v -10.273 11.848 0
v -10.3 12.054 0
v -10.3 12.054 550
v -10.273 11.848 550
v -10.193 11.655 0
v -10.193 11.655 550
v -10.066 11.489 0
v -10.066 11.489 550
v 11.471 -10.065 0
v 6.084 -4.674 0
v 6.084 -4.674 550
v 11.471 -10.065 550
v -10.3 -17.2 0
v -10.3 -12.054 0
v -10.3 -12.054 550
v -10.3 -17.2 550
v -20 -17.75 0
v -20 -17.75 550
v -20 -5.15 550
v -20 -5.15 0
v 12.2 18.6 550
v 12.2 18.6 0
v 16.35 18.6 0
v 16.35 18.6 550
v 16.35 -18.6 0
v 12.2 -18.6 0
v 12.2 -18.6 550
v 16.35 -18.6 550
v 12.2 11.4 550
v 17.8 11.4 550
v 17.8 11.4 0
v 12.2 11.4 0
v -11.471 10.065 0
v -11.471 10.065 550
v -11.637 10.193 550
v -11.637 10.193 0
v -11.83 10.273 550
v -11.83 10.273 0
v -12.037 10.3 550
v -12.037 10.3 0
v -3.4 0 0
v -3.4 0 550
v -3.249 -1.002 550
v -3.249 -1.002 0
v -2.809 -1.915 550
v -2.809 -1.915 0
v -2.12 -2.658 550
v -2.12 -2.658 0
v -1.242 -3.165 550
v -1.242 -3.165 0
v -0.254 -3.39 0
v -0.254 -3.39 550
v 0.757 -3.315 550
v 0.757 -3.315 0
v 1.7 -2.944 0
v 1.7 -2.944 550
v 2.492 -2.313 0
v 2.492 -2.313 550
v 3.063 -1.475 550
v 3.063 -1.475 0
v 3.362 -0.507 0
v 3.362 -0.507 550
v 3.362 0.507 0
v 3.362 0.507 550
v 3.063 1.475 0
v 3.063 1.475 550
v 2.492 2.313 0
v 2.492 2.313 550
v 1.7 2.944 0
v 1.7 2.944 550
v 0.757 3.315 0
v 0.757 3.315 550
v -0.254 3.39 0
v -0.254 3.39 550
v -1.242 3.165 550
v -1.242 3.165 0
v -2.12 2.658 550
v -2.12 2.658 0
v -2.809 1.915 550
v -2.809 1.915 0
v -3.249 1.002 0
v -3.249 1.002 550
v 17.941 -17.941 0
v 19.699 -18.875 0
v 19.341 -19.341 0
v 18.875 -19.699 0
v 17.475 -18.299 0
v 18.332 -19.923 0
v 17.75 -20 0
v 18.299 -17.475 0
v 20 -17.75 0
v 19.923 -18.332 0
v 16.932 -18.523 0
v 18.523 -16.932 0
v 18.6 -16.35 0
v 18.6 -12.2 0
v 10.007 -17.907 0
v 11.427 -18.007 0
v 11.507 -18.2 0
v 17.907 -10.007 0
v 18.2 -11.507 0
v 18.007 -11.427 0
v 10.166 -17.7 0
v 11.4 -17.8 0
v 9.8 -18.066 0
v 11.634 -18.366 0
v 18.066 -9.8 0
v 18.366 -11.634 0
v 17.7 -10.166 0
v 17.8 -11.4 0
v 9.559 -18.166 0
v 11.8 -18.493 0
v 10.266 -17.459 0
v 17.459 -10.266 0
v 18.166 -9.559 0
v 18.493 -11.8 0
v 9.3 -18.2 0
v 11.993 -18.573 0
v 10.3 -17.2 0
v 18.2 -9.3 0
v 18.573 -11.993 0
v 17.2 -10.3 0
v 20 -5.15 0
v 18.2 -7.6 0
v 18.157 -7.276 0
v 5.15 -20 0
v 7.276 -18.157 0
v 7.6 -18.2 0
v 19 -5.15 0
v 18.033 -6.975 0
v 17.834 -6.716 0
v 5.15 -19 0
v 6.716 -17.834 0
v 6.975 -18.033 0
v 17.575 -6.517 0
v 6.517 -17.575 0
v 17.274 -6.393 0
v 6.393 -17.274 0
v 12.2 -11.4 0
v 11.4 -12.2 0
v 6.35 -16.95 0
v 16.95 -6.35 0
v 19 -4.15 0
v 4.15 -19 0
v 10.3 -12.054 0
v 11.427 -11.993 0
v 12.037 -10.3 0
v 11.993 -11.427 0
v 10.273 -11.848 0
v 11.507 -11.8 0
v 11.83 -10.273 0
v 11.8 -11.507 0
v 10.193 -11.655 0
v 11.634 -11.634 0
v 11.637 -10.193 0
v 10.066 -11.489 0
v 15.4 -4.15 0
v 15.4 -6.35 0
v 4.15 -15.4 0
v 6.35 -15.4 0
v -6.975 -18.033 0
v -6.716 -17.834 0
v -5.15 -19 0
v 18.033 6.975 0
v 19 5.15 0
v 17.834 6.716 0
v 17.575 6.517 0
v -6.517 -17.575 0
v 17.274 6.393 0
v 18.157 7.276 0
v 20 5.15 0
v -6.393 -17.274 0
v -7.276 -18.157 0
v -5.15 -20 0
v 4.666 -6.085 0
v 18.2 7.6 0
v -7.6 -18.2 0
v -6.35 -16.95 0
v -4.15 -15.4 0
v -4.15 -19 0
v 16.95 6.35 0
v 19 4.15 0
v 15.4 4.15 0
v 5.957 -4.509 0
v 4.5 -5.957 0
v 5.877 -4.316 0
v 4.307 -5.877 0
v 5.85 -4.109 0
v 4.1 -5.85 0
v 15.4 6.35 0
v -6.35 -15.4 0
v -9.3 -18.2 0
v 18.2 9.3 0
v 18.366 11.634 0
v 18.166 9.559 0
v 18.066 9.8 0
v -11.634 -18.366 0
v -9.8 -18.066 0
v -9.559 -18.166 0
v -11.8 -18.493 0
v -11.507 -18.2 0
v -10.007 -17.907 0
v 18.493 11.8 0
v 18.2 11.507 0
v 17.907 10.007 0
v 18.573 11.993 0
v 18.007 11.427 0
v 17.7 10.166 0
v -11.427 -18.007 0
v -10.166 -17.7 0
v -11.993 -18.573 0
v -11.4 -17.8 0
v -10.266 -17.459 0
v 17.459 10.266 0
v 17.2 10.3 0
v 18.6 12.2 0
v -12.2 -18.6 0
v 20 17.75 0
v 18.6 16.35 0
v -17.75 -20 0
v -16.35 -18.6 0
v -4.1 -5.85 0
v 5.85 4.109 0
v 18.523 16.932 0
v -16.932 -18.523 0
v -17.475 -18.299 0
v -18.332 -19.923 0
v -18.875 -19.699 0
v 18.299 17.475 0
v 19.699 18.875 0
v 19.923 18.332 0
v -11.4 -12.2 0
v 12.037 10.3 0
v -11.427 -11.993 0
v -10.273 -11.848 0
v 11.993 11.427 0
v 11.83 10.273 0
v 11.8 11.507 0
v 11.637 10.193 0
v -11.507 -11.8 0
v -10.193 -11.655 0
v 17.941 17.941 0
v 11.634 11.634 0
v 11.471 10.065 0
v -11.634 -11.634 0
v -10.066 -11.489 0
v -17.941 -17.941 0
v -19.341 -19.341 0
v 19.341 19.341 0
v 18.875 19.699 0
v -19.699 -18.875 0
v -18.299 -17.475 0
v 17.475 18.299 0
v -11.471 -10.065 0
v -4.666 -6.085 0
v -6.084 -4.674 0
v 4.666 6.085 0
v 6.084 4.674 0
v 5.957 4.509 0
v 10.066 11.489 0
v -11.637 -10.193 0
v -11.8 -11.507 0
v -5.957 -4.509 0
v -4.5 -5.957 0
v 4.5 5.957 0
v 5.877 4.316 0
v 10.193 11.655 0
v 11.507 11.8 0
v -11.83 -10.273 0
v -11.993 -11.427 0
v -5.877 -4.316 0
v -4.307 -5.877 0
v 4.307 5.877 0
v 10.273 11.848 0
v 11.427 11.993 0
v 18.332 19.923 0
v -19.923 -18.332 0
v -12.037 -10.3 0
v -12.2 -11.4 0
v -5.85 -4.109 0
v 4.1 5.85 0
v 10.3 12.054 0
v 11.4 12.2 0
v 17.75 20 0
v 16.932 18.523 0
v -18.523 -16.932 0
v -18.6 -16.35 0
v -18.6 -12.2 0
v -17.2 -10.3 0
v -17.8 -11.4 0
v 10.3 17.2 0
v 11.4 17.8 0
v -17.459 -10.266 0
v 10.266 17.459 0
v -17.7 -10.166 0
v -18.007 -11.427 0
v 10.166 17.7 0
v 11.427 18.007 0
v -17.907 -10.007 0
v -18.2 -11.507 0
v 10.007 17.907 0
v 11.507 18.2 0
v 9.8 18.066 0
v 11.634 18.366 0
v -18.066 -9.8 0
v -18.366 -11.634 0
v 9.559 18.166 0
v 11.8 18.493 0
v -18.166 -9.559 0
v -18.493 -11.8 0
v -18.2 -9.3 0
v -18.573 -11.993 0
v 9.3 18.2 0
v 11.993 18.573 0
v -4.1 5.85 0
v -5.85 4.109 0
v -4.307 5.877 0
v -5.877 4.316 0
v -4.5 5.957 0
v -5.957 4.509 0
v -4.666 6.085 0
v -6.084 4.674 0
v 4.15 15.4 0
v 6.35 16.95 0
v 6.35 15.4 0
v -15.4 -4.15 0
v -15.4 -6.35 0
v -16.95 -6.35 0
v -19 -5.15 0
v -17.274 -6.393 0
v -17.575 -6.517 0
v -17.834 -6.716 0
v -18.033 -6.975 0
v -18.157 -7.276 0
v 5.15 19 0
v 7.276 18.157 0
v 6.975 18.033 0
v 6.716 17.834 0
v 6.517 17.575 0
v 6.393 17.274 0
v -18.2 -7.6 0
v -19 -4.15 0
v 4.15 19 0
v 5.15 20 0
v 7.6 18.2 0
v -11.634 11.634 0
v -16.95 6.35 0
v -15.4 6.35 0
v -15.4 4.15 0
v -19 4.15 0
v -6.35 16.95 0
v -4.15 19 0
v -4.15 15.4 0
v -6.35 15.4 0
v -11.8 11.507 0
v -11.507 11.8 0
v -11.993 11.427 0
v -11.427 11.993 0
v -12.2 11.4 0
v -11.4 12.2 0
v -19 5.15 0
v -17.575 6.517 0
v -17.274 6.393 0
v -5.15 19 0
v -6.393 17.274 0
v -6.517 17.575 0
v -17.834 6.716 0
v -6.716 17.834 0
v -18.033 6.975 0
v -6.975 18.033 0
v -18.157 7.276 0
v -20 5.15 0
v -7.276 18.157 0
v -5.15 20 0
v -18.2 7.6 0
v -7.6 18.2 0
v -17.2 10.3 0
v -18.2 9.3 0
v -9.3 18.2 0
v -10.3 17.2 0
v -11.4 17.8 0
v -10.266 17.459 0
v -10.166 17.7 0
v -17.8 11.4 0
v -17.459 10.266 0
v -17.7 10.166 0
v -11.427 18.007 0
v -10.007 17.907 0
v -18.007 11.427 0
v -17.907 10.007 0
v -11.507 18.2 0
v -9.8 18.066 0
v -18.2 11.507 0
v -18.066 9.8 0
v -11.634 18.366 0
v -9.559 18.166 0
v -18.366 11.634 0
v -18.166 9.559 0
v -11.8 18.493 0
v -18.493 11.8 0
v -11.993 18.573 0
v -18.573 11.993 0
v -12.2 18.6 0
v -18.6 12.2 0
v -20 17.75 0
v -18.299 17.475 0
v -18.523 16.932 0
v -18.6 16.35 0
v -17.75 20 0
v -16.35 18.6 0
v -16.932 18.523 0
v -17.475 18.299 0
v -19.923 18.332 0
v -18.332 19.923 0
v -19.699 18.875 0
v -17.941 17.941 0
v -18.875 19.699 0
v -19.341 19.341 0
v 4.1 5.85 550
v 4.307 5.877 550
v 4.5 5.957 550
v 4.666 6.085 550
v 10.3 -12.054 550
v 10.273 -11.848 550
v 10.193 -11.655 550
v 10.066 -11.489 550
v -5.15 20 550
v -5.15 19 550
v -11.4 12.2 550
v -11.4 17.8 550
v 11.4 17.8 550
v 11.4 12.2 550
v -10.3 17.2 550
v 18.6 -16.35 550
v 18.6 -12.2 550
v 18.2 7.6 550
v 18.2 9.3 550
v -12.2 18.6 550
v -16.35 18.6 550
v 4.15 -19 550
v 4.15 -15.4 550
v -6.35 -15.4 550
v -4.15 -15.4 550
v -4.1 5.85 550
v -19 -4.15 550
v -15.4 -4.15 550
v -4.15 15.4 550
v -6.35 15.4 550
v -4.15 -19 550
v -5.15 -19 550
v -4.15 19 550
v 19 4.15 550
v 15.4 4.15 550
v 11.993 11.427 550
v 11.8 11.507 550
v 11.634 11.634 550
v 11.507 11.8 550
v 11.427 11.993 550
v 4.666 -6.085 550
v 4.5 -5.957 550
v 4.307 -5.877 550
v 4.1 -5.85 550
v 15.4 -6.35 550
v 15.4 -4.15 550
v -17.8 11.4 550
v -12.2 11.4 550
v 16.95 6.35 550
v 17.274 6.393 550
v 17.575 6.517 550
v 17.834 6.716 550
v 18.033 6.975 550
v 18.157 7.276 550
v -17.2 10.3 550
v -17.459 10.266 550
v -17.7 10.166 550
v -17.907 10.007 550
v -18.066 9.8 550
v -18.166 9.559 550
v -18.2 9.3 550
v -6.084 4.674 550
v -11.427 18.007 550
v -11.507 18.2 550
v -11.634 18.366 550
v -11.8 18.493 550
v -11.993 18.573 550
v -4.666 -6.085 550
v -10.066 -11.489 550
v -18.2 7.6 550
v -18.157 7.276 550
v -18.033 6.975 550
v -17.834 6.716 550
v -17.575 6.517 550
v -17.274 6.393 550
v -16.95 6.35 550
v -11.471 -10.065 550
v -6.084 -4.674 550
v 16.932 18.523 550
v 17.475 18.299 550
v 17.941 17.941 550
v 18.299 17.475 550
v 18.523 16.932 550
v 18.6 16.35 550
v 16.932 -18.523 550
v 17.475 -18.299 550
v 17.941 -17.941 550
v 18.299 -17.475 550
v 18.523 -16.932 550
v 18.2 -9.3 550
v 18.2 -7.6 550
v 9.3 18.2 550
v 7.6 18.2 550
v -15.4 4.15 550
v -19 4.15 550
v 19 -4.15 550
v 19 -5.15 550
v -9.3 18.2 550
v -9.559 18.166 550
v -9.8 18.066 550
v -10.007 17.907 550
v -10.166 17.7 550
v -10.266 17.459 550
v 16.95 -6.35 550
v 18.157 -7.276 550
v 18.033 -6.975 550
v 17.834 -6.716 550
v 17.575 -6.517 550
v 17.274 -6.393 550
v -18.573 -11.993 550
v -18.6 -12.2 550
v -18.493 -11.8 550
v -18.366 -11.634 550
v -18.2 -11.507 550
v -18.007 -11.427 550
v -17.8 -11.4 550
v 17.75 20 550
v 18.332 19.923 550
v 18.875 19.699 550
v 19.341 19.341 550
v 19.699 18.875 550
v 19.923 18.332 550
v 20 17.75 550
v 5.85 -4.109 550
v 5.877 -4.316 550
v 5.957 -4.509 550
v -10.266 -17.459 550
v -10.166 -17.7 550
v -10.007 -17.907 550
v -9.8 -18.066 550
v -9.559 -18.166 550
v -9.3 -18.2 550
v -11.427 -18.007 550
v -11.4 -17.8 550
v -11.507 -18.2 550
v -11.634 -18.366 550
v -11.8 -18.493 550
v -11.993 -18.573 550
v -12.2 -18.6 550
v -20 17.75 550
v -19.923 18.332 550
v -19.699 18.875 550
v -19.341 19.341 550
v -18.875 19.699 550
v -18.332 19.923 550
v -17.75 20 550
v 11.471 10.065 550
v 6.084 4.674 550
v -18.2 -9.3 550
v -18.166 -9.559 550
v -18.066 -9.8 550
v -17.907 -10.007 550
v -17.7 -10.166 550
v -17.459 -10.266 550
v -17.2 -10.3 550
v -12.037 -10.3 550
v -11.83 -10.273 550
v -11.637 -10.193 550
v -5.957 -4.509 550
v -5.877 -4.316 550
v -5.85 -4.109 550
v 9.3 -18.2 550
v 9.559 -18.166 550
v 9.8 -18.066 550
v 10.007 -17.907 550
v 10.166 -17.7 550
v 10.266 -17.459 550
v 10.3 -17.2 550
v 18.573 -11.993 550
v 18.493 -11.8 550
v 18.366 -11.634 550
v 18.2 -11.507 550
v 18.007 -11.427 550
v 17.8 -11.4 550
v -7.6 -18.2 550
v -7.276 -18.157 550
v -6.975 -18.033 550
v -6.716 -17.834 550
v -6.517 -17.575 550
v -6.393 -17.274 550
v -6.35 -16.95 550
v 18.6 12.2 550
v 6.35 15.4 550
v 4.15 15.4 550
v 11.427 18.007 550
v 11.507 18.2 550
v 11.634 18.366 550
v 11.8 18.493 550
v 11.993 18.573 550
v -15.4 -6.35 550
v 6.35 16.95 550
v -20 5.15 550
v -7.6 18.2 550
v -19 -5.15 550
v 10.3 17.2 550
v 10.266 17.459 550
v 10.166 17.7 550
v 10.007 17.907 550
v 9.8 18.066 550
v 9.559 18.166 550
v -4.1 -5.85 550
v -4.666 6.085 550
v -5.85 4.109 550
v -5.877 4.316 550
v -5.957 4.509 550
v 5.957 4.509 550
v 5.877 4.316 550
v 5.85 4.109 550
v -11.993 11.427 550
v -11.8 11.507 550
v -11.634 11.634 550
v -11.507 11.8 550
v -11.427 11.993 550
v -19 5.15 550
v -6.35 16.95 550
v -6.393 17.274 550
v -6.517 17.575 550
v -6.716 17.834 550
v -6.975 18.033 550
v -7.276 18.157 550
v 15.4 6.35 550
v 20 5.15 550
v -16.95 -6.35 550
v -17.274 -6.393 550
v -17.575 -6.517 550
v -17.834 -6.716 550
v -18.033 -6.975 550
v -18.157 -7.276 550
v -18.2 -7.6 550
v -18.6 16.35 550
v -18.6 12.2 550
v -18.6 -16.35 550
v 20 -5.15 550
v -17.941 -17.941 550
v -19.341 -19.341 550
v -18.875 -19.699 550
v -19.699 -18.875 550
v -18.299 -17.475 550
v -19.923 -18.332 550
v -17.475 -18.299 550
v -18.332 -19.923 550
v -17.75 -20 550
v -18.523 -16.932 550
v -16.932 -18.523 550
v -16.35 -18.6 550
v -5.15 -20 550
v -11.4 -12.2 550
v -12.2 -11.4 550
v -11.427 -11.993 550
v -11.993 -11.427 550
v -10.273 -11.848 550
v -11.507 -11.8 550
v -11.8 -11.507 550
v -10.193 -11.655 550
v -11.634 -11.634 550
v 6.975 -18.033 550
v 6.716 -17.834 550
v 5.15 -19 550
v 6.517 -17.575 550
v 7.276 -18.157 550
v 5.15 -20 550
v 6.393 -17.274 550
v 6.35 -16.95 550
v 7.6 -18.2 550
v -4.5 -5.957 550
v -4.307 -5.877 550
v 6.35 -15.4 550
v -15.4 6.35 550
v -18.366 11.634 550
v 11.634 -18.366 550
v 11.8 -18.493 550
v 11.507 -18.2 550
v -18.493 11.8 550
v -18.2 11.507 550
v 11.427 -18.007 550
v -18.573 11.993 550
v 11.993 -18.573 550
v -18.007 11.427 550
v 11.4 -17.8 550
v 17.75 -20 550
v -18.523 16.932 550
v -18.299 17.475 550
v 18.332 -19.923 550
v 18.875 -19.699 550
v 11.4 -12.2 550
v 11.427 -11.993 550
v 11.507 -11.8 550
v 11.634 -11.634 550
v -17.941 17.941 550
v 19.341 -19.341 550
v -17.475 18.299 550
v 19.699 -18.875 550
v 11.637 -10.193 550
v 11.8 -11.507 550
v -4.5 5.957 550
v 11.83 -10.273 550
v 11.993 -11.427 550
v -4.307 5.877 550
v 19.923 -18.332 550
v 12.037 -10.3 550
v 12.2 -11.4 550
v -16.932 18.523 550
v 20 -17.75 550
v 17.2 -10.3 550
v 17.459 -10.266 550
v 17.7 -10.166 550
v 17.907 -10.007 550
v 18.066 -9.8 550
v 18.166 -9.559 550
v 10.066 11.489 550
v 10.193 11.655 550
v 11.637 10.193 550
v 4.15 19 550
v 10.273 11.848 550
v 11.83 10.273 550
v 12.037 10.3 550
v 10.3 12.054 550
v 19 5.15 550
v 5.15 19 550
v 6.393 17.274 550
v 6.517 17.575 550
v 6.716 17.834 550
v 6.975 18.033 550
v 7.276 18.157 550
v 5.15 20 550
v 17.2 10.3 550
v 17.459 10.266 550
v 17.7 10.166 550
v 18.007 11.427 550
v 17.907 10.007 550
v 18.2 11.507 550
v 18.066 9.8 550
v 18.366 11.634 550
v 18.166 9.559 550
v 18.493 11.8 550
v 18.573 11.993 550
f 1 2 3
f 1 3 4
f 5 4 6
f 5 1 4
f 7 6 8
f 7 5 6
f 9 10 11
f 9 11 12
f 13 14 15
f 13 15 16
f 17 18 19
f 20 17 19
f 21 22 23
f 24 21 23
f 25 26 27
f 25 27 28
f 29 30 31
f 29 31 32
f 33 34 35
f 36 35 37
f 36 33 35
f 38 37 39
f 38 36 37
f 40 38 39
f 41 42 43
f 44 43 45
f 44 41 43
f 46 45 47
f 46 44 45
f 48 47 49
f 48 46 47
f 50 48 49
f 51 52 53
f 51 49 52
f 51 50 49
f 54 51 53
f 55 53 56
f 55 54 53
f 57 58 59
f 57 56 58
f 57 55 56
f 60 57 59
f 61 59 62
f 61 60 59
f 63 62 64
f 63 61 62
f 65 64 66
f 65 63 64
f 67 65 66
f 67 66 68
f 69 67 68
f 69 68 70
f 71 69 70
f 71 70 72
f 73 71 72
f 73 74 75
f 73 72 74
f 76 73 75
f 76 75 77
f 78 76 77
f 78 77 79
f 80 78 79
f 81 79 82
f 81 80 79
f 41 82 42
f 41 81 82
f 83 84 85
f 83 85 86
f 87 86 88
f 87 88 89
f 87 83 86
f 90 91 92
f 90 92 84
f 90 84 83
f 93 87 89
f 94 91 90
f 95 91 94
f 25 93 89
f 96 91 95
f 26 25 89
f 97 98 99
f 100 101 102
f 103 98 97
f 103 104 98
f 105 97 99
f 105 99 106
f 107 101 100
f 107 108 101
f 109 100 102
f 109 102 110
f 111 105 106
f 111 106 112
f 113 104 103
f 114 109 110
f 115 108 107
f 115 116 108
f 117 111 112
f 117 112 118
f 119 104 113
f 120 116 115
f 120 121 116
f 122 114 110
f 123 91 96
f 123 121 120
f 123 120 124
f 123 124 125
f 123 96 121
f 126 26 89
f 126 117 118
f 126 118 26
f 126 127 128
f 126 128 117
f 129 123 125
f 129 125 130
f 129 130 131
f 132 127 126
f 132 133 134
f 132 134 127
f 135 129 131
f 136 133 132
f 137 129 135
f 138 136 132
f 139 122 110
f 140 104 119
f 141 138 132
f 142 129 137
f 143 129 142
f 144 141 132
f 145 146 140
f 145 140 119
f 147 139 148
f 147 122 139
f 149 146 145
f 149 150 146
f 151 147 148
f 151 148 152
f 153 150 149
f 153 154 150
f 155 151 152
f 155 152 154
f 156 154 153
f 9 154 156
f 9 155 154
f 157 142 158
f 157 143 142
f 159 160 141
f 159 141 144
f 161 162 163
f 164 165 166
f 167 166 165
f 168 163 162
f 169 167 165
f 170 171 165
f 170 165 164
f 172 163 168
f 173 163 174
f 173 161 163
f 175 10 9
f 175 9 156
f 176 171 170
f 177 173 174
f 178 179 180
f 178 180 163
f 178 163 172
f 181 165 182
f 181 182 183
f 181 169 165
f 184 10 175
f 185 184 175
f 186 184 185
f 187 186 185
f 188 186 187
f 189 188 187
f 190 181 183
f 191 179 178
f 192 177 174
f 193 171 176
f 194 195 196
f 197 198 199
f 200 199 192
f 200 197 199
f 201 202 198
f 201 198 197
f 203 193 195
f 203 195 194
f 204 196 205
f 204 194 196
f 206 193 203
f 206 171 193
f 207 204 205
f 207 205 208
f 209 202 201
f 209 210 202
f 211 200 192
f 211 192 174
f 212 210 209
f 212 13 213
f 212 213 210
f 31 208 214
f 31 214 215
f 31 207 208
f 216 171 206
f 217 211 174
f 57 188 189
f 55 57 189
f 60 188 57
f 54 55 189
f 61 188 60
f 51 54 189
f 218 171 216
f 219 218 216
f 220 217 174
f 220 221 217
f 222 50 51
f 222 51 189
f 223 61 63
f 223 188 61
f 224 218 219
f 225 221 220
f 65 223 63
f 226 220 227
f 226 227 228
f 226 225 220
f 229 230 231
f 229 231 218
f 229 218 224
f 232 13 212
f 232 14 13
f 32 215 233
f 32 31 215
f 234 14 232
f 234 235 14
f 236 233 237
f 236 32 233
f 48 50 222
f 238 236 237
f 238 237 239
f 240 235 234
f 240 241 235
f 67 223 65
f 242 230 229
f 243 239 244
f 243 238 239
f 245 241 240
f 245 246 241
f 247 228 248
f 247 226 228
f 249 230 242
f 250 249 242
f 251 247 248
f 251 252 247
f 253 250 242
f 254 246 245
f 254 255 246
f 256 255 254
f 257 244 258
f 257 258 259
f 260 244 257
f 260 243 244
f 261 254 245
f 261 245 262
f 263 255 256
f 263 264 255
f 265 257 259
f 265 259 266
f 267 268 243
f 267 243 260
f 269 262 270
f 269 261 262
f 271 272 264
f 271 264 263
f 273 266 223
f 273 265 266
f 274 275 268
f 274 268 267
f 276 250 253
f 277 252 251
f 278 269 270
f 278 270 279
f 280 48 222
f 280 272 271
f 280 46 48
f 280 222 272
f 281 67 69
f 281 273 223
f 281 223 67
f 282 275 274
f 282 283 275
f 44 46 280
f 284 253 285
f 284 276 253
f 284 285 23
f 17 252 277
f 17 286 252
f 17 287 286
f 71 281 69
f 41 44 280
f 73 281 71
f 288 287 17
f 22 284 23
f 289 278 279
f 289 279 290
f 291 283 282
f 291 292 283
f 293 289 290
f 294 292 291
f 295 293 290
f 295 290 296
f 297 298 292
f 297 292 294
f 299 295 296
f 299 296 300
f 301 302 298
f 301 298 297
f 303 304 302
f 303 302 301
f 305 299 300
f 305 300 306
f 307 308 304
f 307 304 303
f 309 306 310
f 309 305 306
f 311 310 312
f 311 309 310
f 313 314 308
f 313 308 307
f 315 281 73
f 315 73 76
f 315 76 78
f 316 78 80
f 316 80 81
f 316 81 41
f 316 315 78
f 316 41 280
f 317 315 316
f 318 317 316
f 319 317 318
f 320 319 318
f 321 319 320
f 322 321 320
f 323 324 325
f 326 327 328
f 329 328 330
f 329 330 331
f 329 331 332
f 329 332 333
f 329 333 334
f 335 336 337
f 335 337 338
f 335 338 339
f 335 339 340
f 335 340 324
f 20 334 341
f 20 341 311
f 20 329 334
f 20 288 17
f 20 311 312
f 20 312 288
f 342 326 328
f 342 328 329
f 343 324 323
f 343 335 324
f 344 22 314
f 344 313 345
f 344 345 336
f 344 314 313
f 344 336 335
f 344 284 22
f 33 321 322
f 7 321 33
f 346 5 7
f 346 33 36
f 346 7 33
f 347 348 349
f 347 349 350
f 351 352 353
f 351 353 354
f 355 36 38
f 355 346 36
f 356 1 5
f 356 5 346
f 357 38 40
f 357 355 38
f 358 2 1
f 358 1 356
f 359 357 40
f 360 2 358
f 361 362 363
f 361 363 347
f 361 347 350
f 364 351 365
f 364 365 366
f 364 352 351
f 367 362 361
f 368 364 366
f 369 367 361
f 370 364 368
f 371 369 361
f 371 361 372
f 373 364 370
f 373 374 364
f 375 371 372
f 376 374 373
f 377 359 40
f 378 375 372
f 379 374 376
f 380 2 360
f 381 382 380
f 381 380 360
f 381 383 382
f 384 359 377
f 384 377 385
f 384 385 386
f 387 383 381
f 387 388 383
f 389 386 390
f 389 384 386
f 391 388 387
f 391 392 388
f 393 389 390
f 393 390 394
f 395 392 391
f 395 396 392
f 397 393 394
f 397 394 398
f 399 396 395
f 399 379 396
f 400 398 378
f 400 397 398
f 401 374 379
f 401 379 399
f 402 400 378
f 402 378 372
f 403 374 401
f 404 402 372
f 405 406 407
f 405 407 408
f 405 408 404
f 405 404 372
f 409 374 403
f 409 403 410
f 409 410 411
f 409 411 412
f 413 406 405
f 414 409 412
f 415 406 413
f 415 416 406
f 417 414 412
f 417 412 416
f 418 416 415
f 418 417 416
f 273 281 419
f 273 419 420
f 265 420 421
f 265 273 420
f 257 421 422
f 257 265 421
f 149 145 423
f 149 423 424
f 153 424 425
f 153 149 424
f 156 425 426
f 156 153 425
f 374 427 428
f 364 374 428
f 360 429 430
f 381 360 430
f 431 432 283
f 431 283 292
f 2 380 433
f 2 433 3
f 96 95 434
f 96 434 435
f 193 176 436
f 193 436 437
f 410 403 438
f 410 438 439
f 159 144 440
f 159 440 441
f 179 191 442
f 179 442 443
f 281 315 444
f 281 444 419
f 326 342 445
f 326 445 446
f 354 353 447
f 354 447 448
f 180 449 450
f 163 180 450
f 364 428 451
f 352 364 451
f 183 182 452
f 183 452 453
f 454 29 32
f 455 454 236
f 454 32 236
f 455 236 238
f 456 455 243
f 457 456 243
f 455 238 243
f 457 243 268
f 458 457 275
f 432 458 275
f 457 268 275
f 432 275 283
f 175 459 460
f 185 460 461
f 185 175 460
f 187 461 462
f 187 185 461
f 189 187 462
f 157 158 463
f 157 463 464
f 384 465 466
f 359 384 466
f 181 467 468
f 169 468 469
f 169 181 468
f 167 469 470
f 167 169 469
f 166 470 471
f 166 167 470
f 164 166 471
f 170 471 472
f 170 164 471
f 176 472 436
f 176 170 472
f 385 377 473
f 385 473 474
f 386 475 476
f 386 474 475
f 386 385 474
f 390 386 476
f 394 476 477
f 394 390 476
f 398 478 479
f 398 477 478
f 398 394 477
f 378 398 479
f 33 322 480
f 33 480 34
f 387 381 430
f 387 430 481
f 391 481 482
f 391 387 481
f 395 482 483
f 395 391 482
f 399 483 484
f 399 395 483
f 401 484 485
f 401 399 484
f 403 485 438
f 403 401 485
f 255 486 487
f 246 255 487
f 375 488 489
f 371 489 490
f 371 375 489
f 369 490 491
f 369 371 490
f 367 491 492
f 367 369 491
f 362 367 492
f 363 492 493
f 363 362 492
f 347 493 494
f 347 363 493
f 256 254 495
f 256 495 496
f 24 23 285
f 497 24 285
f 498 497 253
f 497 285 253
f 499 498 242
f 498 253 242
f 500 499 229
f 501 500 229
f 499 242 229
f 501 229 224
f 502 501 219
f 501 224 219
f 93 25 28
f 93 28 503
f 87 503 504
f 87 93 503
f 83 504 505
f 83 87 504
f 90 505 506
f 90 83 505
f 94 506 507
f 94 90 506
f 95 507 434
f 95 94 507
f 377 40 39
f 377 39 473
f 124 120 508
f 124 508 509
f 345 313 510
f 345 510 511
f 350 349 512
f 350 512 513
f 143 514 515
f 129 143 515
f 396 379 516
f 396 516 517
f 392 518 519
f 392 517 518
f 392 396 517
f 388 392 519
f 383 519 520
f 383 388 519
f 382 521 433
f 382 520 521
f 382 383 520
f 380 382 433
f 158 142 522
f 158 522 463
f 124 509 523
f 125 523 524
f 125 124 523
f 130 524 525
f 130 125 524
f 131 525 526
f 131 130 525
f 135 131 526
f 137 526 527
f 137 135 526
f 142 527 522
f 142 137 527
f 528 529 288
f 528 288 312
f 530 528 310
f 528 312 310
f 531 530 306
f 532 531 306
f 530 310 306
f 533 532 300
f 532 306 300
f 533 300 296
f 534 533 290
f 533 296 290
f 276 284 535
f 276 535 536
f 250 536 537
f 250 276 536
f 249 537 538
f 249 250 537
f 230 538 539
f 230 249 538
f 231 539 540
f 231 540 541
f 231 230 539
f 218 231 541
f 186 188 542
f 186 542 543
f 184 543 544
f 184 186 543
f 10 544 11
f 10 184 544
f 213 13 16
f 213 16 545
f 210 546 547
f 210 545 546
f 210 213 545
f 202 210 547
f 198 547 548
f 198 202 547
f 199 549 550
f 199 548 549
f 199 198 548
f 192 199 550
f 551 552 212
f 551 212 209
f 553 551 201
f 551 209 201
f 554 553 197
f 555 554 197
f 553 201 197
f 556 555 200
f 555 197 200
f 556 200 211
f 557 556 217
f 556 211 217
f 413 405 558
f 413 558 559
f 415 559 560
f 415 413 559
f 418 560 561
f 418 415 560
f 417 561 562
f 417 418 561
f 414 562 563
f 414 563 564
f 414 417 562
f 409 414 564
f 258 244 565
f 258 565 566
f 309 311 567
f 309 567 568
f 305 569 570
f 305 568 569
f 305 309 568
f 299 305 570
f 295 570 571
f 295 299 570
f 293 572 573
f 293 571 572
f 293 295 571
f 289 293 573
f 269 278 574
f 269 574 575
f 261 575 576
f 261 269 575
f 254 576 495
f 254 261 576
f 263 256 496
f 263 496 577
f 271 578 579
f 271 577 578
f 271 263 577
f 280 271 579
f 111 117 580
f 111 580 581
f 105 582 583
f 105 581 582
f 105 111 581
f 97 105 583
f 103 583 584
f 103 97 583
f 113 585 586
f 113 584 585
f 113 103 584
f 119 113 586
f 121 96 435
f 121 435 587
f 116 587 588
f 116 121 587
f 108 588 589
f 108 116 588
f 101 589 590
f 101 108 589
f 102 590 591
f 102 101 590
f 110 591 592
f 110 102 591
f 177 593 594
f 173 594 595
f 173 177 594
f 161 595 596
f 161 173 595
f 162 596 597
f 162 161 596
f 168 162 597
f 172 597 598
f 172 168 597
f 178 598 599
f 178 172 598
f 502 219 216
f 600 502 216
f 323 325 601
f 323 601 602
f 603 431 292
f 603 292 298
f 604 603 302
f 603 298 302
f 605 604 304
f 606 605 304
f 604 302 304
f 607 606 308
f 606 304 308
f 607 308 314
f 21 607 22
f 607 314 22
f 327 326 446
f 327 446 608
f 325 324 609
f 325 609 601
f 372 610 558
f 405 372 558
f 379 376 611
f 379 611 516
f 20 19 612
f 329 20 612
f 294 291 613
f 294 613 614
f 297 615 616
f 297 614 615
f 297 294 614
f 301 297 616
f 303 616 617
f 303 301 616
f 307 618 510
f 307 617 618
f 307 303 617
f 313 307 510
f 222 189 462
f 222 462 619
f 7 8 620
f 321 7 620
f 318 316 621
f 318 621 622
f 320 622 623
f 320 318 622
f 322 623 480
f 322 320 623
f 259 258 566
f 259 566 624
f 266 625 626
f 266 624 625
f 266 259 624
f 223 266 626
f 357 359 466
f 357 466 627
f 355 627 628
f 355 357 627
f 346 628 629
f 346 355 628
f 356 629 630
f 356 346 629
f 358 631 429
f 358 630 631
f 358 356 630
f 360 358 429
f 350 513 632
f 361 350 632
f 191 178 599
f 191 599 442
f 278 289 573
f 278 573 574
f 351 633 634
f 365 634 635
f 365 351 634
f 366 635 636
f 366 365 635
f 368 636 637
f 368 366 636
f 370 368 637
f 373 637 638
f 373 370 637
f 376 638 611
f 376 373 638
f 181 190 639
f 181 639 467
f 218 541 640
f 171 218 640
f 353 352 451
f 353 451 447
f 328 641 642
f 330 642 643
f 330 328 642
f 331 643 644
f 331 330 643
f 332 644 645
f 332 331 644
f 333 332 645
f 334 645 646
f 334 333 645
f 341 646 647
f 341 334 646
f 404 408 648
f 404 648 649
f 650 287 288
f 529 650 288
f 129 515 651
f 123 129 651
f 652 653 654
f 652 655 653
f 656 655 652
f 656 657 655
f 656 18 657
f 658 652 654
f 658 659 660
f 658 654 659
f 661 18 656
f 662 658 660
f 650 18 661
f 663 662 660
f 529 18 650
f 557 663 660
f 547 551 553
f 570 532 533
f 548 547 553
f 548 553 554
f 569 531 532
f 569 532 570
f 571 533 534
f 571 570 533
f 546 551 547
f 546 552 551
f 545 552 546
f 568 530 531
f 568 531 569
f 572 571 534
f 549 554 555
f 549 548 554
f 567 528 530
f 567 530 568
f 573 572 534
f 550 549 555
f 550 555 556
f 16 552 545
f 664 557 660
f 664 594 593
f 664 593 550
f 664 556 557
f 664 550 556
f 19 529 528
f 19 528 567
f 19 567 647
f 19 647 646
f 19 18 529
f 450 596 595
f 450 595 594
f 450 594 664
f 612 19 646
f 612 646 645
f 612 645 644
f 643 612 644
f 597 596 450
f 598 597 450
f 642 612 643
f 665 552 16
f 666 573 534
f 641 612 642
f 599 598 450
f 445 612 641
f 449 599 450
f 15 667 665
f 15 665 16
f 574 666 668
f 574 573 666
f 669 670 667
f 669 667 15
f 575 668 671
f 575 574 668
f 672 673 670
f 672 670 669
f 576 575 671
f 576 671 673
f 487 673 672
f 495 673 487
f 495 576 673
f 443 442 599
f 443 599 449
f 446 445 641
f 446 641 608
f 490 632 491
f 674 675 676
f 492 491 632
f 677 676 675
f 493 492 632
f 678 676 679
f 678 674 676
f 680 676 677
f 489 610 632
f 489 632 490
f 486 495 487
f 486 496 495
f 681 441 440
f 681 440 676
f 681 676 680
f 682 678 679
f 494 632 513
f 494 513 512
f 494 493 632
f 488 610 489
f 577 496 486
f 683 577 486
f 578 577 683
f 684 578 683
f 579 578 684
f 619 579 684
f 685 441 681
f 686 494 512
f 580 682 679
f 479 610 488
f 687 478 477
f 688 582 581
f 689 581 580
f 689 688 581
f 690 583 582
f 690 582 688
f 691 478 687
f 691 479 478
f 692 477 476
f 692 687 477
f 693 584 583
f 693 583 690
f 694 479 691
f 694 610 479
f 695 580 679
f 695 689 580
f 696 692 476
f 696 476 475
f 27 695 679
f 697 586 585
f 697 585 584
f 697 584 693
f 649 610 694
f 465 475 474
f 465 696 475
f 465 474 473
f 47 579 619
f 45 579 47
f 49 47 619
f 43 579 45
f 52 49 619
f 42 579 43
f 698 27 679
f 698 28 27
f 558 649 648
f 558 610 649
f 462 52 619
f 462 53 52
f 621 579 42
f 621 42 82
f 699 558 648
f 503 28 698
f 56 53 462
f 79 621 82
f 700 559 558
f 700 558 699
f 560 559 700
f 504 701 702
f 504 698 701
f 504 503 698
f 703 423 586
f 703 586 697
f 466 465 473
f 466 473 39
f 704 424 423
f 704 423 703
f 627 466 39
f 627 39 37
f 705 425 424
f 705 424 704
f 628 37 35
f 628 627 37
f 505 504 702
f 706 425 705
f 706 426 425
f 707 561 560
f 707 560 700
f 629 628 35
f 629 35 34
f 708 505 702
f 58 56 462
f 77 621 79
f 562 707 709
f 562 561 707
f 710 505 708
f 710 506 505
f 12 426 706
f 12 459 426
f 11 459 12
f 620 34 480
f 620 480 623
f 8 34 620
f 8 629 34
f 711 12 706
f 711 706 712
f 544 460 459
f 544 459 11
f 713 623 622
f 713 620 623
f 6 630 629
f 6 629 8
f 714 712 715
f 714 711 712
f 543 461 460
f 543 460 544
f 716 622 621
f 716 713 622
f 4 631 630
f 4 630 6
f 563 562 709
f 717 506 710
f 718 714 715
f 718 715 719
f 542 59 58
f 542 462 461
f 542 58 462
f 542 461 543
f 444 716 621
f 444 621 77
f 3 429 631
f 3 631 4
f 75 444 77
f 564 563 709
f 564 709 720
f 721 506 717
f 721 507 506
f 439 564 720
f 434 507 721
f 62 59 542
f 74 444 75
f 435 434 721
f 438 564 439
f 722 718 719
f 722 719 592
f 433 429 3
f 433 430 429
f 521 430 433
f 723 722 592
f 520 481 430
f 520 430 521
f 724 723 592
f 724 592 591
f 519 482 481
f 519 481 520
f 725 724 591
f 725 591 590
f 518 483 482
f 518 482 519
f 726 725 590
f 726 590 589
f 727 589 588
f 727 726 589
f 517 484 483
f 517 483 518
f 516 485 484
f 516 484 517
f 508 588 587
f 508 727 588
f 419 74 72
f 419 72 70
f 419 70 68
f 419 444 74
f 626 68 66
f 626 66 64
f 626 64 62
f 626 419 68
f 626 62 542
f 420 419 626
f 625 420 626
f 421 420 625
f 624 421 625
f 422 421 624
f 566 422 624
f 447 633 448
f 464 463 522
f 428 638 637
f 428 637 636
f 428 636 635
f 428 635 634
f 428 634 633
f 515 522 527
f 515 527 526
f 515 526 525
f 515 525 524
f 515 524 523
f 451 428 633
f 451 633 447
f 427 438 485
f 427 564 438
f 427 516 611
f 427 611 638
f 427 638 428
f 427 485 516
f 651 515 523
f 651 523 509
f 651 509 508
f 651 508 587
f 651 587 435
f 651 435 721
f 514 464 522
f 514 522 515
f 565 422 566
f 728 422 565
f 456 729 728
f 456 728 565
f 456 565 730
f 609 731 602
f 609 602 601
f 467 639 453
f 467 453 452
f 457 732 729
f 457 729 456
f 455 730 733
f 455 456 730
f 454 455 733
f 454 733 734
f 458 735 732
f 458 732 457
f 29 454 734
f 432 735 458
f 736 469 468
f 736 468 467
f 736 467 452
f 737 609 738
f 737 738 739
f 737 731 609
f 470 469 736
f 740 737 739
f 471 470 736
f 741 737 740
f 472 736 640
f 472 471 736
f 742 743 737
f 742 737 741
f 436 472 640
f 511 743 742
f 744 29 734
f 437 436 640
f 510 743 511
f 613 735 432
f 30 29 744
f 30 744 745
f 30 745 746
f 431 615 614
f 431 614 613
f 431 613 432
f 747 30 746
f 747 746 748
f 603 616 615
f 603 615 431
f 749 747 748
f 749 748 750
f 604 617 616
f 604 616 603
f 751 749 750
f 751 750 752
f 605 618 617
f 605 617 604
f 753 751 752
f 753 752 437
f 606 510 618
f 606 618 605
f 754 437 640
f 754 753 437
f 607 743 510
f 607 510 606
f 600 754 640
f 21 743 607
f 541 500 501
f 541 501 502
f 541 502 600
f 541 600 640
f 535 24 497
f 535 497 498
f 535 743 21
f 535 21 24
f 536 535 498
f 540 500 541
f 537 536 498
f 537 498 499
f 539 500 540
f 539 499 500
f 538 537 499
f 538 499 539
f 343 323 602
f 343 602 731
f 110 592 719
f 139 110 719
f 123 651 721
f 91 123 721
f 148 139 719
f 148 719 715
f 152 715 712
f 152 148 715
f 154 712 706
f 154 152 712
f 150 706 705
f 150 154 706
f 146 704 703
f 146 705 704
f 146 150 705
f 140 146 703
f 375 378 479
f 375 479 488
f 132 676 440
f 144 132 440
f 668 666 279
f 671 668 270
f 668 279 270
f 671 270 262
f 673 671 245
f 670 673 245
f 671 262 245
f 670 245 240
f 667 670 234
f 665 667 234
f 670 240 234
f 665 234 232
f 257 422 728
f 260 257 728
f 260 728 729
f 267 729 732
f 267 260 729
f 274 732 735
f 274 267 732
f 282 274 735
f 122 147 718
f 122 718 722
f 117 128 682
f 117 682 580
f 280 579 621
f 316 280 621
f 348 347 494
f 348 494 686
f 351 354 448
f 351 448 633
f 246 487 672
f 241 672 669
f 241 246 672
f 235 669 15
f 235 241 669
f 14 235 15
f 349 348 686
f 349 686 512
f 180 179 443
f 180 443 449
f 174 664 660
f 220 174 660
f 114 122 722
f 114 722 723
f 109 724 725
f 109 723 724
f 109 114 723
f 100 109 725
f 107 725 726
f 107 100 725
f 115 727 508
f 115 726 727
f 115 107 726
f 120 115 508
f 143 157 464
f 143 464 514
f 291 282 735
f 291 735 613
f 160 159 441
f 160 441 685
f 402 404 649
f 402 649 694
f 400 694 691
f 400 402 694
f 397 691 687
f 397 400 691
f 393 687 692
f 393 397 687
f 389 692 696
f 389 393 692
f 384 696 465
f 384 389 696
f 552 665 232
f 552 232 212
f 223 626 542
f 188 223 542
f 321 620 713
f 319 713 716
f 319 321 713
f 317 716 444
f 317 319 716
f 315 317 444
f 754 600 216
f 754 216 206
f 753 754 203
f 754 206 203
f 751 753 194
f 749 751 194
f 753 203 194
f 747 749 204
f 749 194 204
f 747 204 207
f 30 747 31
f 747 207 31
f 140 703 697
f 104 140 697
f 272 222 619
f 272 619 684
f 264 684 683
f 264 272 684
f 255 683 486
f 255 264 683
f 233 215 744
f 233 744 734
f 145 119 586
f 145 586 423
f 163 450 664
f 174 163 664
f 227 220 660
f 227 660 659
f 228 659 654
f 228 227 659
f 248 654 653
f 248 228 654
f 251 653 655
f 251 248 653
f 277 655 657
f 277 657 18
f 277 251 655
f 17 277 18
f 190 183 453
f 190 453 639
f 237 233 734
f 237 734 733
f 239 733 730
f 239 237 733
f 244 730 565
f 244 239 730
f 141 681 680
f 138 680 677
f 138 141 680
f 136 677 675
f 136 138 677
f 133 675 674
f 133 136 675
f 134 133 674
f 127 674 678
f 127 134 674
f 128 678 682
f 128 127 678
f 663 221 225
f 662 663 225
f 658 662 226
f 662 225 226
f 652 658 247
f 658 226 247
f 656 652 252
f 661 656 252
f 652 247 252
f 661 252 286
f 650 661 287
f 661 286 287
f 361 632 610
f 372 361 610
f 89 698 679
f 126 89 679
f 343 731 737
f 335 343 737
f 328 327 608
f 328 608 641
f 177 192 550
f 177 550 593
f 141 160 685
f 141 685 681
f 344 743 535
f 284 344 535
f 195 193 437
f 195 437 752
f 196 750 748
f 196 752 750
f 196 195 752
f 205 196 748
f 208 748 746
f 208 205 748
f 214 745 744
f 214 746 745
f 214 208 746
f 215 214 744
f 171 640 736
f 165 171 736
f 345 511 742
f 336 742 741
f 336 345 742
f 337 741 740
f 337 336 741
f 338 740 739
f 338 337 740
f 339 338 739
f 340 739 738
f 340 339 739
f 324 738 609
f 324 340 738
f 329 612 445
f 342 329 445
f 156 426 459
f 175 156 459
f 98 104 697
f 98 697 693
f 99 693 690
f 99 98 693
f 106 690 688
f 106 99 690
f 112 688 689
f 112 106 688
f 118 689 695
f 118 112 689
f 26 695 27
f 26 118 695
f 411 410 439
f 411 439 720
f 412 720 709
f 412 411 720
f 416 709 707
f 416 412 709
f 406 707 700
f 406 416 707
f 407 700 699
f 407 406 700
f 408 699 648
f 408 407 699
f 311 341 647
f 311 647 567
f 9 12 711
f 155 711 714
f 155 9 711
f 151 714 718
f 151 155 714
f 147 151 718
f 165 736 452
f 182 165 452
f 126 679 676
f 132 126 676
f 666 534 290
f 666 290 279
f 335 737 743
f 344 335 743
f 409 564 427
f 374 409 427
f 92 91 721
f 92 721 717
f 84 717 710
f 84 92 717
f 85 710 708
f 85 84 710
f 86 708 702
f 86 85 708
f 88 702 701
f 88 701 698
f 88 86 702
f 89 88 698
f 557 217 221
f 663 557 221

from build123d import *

# Parameters (mm, degrees)
SKETCH1_R           = 3.4
BOSS_EXTRUDE1_DEPTH = 713
SKETCH2_W           = 40
SKETCH2_H           = 163
CUT_EXTRUDE1_DEPTH  = 715.401147815


with BuildPart() as part:
    # Sketch1 → Boss-Extrude1 (new body)
    with BuildSketch(Plane.XY):
        with BuildLine():
            Line((20, 17.75), (20, 5.15))
            Line((20, 5.15), (19, 5.15))
            Line((19, 5.15), (19, 4.15))
            Line((19, 4.15), (15.4, 4.15))
            Line((15.4, 4.15), (15.4, 6.35))
            Line((15.4, 6.35), (16.95, 6.35))
            ThreePointArc((16.95, 6.35), (17.833883476, 6.716116524), (18.2, 7.6))
            Line((18.2, 7.6), (18.2, 9.3))
            ThreePointArc((18.2, 9.3), (17.907106781, 10.007106781), (17.2, 10.3))
            Line((17.2, 10.3), (12.03669957, 10.3))
            ThreePointArc((12.03669957, 10.3), (11.73040037, 10.239040459), (11.470780817, 10.065452001))
            Line((11.470780817, 10.065452001), (6.084081247, 4.674305984))
            ThreePointArc((6.084081247, 4.674305984), (5.910833239, 4.414848262), (5.85, 4.108853983))
            Line((5.85, 4.108853983), (5.85, -4.108853983))
            ThreePointArc((5.85, -4.108853983), (5.910833239, -4.414848262), (6.084081247, -4.674305984))
            Line((6.084081247, -4.674305984), (11.470780817, -10.065452001))
            ThreePointArc((11.470780817, -10.065452001), (11.73040037, -10.239040459), (12.03669957, -10.3))
            Line((12.03669957, -10.3), (17.2, -10.3))
            ThreePointArc((17.2, -10.3), (17.907106781, -10.007106781), (18.2, -9.3))
            Line((18.2, -9.3), (18.2, -7.6))
            ThreePointArc((18.2, -7.6), (17.833883476, -6.716116524), (16.95, -6.35))
            Line((16.95, -6.35), (15.4, -6.35))
            Line((15.4, -6.35), (15.4, -4.15))
            Line((15.4, -4.15), (19, -4.15))
            Line((19, -4.15), (19, -5.15))
            Line((19, -5.15), (20, -5.15))
            Line((20, -5.15), (20, -17.75))
            ThreePointArc((20, -17.75), (19.340990258, -19.340990258), (17.75, -20))
            Line((17.75, -20), (5.15, -20))
            Line((5.15, -20), (5.15, -19))
            Line((5.15, -19), (4.15, -19))
            Line((4.15, -19), (4.15, -15.4))
            Line((4.15, -15.4), (6.35, -15.4))
            Line((6.35, -15.4), (6.35, -16.95))
            ThreePointArc((6.35, -16.95), (6.716116524, -17.833883476), (7.6, -18.2))
            Line((7.6, -18.2), (9.3, -18.2))
            ThreePointArc((9.3, -18.2), (10.007106781, -17.907106781), (10.3, -17.2))
            Line((10.3, -17.2), (10.3, -12.054477022))
            ThreePointArc((10.3, -12.054477022), (10.239166761, -11.748482743), (10.065918753, -11.489025021))
            Line((10.065918753, -11.489025021), (4.665899173, -6.084547999))
            ThreePointArc((4.665899173, -6.084547999), (4.406279619, -5.910959541), (4.09998042, -5.85))
            Line((4.09998042, -5.85), (-4.09998042, -5.85))
            ThreePointArc((-4.09998042, -5.85), (-4.406279619, -5.910959541), (-4.665899173, -6.084547999))
            Line((-4.665899173, -6.084547999), (-10.065918753, -11.489025021))
            ThreePointArc((-10.065918753, -11.489025021), (-10.239166761, -11.748482743), (-10.3, -12.054477022))
            Line((-10.3, -12.054477022), (-10.3, -17.2))
            ThreePointArc((-10.3, -17.2), (-10.007106781, -17.907106781), (-9.3, -18.2))
            Line((-9.3, -18.2), (-7.6, -18.2))
            ThreePointArc((-7.6, -18.2), (-6.716116524, -17.833883476), (-6.35, -16.95))
            Line((-6.35, -16.95), (-6.35, -15.4))
            Line((-6.35, -15.4), (-4.15, -15.4))
            Line((-4.15, -15.4), (-4.15, -19))
            Line((-4.15, -19), (-5.15, -19))
            Line((-5.15, -19), (-5.15, -20))
            Line((-5.15, -20), (-17.75, -20))
            ThreePointArc((-17.75, -20), (-19.340990258, -19.340990258), (-20, -17.75))
            Line((-20, -17.75), (-20, -5.15))
            Line((-20, -5.15), (-19, -5.15))
            Line((-19, -5.15), (-19, -4.15))
            Line((-19, -4.15), (-15.4, -4.15))
            Line((-15.4, -4.15), (-15.4, -6.35))
            Line((-15.4, -6.35), (-16.95, -6.35))
            ThreePointArc((-16.95, -6.35), (-17.833883476, -6.716116524), (-18.2, -7.6))
            Line((-18.2, -7.6), (-18.2, -9.3))
            ThreePointArc((-18.2, -9.3), (-17.907106781, -10.007106781), (-17.2, -10.3))
            Line((-17.2, -10.3), (-12.03669957, -10.3))
            ThreePointArc((-12.03669957, -10.3), (-11.73040037, -10.239040459), (-11.470780817, -10.065452001))
            Line((-11.470780817, -10.065452001), (-6.084081247, -4.674305984))
            ThreePointArc((-6.084081247, -4.674305984), (-5.910833239, -4.414848262), (-5.85, -4.108853983))
            Line((-5.85, -4.108853983), (-5.85, 4.108853983))
            ThreePointArc((-5.85, 4.108853983), (-5.910833239, 4.414848262), (-6.084081247, 4.674305984))
            Line((-6.084081247, 4.674305984), (-11.470780817, 10.065452001))
            ThreePointArc((-11.470780817, 10.065452001), (-11.73040037, 10.239040459), (-12.03669957, 10.3))
            Line((-12.03669957, 10.3), (-17.2, 10.3))
            ThreePointArc((-17.2, 10.3), (-17.907106781, 10.007106781), (-18.2, 9.3))
            Line((-18.2, 9.3), (-18.2, 7.6))
            ThreePointArc((-18.2, 7.6), (-17.833883476, 6.716116524), (-16.95, 6.35))
            Line((-16.95, 6.35), (-15.4, 6.35))
            Line((-15.4, 6.35), (-15.4, 4.15))
            Line((-15.4, 4.15), (-19, 4.15))
            Line((-19, 4.15), (-19, 5.15))
            Line((-19, 5.15), (-20, 5.15))
            Line((-20, 5.15), (-20, 17.75))
            ThreePointArc((-20, 17.75), (-19.340990258, 19.340990258), (-17.75, 20))
            Line((-17.75, 20), (-5.15, 20))
            Line((-5.15, 20), (-5.15, 19))
            Line((-5.15, 19), (-4.15, 19))
            Line((-4.15, 19), (-4.15, 15.4))
            Line((-4.15, 15.4), (-6.35, 15.4))
            Line((-6.35, 15.4), (-6.35, 16.95))
            ThreePointArc((-6.35, 16.95), (-6.716116524, 17.833883476), (-7.6, 18.2))
            Line((-7.6, 18.2), (-9.3, 18.2))
            ThreePointArc((-9.3, 18.2), (-10.007106781, 17.907106781), (-10.3, 17.2))
            Line((-10.3, 17.2), (-10.3, 12.054477022))
            ThreePointArc((-10.3, 12.054477022), (-10.239166761, 11.748482743), (-10.065918753, 11.489025021))
            Line((-10.065918753, 11.489025021), (-4.665899173, 6.084547999))
            ThreePointArc((-4.665899173, 6.084547999), (-4.406279619, 5.910959541), (-4.09998042, 5.85))
            Line((-4.09998042, 5.85), (4.09998042, 5.85))
            ThreePointArc((4.09998042, 5.85), (4.406279619, 5.910959541), (4.665899173, 6.084547999))
            Line((4.665899173, 6.084547999), (10.065918753, 11.489025021))
            ThreePointArc((10.065918753, 11.489025021), (10.239166761, 11.748482743), (10.3, 12.054477022))
            Line((10.3, 12.054477022), (10.3, 17.2))
            ThreePointArc((10.3, 17.2), (10.007106781, 17.907106781), (9.3, 18.2))
            Line((9.3, 18.2), (7.6, 18.2))
            ThreePointArc((7.6, 18.2), (6.716116524, 17.833883476), (6.35, 16.95))
            Line((6.35, 16.95), (6.35, 15.4))
            Line((6.35, 15.4), (4.15, 15.4))
            Line((4.15, 15.4), (4.15, 19))
            Line((4.15, 19), (5.15, 19))
            Line((5.15, 19), (5.15, 20))
            Line((5.15, 20), (17.75, 20))
            ThreePointArc((17.75, 20), (19.340990258, 19.340990258), (20, 17.75))
        make_face()
        with Locations(Location((0, 0, 0), (0, 0, 180))):
            Circle(SKETCH1_R, mode=Mode.SUBTRACT)
        with BuildLine():
            Line((18.6, 16.35), (18.6, 12.2))
            ThreePointArc((18.6, 12.2), (18.365685425, 11.634314575), (17.8, 11.4))
            Line((17.8, 11.4), (12.2, 11.4))
            ThreePointArc((12.2, 11.4), (11.634314575, 11.634314575), (11.4, 12.2))
            Line((11.4, 12.2), (11.4, 17.8))
            ThreePointArc((11.4, 17.8), (11.634314575, 18.365685425), (12.2, 18.6))
            Line((12.2, 18.6), (16.35, 18.6))
            ThreePointArc((16.35, 18.6), (17.940990258, 17.940990258), (18.6, 16.35))
        make_face(mode=Mode.SUBTRACT)
        with BuildLine():
            Line((-12.2, 18.6), (-16.35, 18.6))
            ThreePointArc((-16.35, 18.6), (-17.940990258, 17.940990258), (-18.6, 16.35))
            Line((-18.6, 16.35), (-18.6, 12.2))
            ThreePointArc((-18.6, 12.2), (-18.365685425, 11.634314575), (-17.8, 11.4))
            Line((-17.8, 11.4), (-12.2, 11.4))
            ThreePointArc((-12.2, 11.4), (-11.634314575, 11.634314575), (-11.4, 12.2))
            Line((-11.4, 12.2), (-11.4, 17.8))
            ThreePointArc((-11.4, 17.8), (-11.634314575, 18.365685425), (-12.2, 18.6))
        make_face(mode=Mode.SUBTRACT)
        with BuildLine():
            Line((-18.6, -16.35), (-18.6, -12.2))
            ThreePointArc((-18.6, -12.2), (-18.365685425, -11.634314575), (-17.8, -11.4))
            Line((-17.8, -11.4), (-12.2, -11.4))
            ThreePointArc((-12.2, -11.4), (-11.634314575, -11.634314575), (-11.4, -12.2))
            Line((-11.4, -12.2), (-11.4, -17.8))
            ThreePointArc((-11.4, -17.8), (-11.634314575, -18.365685425), (-12.2, -18.6))
            Line((-12.2, -18.6), (-16.35, -18.6))
            ThreePointArc((-16.35, -18.6), (-17.940990258, -17.940990258), (-18.6, -16.35))
        make_face(mode=Mode.SUBTRACT)
        with BuildLine():
            Line((12.2, -18.6), (16.35, -18.6))
            ThreePointArc((16.35, -18.6), (17.940990258, -17.940990258), (18.6, -16.35))
            Line((18.6, -16.35), (18.6, -12.2))
            ThreePointArc((18.6, -12.2), (18.365685425, -11.634314575), (17.8, -11.4))
            Line((17.8, -11.4), (12.2, -11.4))
            ThreePointArc((12.2, -11.4), (11.634314575, -11.634314575), (11.4, -12.2))
            Line((11.4, -12.2), (11.4, -17.8))
            ThreePointArc((11.4, -17.8), (11.634314575, -18.365685425), (12.2, -18.6))
        make_face(mode=Mode.SUBTRACT)
    extrude(amount=BOSS_EXTRUDE1_DEPTH)

    # Sketch2 → Cut-Extrude1 (cut, through all)
    with BuildSketch(Plane(origin=(0, 20, 0), x_dir=(1, 0, 0), z_dir=(0, 1, 0))):
        with Locations((0, -631.5)):
            Rectangle(SKETCH2_W, SKETCH2_H)
    extrude(amount=-CUT_EXTRUDE1_DEPTH, mode=Mode.SUBTRACT)


solid = part.part
